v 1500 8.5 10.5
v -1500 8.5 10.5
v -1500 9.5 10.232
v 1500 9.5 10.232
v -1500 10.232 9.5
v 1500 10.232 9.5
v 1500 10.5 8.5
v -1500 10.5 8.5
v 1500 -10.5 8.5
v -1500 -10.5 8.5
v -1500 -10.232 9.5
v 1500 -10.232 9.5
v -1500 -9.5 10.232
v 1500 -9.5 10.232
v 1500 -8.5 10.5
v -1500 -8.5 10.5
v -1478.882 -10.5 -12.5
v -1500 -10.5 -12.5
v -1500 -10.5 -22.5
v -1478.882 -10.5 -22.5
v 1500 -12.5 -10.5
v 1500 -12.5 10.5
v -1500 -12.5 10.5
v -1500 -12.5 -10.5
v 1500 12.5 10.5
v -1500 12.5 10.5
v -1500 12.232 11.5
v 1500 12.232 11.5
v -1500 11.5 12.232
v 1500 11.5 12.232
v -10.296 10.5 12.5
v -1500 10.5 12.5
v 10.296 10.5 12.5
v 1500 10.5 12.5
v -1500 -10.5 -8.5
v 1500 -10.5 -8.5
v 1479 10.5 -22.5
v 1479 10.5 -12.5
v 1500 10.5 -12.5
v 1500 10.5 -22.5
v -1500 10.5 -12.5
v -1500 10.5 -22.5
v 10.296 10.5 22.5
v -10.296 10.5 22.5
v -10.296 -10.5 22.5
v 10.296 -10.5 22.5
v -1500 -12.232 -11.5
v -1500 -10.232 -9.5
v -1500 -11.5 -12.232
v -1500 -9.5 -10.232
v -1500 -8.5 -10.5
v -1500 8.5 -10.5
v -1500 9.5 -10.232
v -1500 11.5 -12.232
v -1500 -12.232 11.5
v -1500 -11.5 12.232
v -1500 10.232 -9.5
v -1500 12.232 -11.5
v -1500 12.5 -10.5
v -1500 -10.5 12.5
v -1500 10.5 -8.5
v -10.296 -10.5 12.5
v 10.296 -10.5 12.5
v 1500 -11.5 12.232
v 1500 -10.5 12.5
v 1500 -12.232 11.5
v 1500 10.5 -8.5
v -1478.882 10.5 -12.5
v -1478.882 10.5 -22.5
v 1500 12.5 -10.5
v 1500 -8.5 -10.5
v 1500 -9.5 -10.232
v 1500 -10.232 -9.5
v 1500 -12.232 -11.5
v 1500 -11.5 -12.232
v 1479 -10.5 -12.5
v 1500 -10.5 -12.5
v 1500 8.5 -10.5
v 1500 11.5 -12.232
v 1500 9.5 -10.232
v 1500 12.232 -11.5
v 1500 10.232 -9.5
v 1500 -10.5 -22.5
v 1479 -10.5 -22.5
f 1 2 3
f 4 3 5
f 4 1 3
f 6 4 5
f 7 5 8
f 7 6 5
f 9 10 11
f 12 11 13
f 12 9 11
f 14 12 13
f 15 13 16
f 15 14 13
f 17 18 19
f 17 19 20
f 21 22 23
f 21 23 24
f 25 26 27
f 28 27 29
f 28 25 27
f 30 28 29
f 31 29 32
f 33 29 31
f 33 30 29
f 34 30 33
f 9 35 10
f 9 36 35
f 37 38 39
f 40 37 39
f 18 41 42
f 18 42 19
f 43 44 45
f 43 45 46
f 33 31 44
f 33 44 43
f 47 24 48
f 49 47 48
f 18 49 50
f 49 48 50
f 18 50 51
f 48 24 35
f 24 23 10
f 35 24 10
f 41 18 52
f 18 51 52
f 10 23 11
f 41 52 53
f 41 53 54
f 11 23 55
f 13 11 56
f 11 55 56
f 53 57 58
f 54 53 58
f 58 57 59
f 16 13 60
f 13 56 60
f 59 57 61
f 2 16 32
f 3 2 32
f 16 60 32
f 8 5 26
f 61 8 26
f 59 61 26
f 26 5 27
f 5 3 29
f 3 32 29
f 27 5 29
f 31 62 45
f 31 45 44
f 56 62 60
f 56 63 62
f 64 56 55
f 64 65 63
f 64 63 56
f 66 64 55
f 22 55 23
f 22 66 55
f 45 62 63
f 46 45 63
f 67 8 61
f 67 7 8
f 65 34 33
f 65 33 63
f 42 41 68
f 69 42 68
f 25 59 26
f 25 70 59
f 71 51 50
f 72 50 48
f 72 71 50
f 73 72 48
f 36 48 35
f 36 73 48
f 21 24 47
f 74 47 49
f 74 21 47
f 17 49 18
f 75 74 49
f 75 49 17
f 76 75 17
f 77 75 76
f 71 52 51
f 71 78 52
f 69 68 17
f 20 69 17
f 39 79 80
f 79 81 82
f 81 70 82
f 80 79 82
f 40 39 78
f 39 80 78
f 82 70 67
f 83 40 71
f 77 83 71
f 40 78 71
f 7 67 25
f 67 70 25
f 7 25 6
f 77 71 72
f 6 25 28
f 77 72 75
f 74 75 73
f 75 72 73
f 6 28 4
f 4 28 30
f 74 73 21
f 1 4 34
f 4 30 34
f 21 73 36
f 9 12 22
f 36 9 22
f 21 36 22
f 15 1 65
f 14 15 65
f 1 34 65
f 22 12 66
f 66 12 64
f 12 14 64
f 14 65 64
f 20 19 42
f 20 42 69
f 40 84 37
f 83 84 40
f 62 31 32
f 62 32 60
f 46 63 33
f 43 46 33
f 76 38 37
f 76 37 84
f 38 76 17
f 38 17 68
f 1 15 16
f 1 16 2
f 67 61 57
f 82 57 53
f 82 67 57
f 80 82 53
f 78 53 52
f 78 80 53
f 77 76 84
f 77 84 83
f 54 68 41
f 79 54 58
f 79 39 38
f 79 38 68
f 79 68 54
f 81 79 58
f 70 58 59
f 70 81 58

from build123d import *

# Parameters (mm, degrees)
F1_DEPTH = 1500
F2_W     = 21.117687
F2_H     = 21
F3_DEPTH = 10
F2_W_2   = 21
F4_DEPTH = 10
F5_W     = 20.59104
F5_H     = 21
F6_DEPTH = 10


with BuildPart() as f1:
    # F0 (on Right) → F1 (new body, symmetric)
    with BuildSketch(Plane.YZ):
        with BuildLine():
            ThreePointArc((12.5, 10.5), (11.914214, 11.914214), (10.5, 12.5))
            Line((10.5, 12.5), (-10.5, 12.5))
            ThreePointArc((-10.5, 12.5), (-11.914214, 11.914214), (-12.5, 10.5))
            Line((-12.5, 10.5), (-12.5, -10.5))
            ThreePointArc((-12.5, -10.5), (-11.914214, -11.914214), (-10.5, -12.5))
            Line((-10.5, -12.5), (10.5, -12.5))
            ThreePointArc((10.5, -12.5), (11.914214, -11.914214), (12.5, -10.5))
            Line((12.5, -10.5), (12.5, 10.5))
        make_face()
        with BuildLine():
            Line((-8.5, 10.5), (8.5, 10.5))
            ThreePointArc((8.5, 10.5), (9.914214, 9.914214), (10.5, 8.5))
            Line((10.5, 8.5), (10.5, -8.5))
            ThreePointArc((10.5, -8.5), (9.914214, -9.914214), (8.5, -10.5))
            Line((8.5, -10.5), (-8.5, -10.5))
            ThreePointArc((-8.5, -10.5), (-9.914214, -9.914214), (-10.5, -8.5))
            Line((-10.5, -8.5), (-10.5, 8.5))
            ThreePointArc((-10.5, 8.5), (-9.914214, 9.914214), (-8.5, 10.5))
        make_face(mode=Mode.SUBTRACT)
    extrude(amount=F1_DEPTH, both=True)

    # F2 (on face) → F3 (join)
    with BuildSketch(Plane(origin=(0, 0, -12.5), x_dir=(1, 0, 0), z_dir=(0, 0, -1))):
        with Locations((-1489.441157, 0)):
            Rectangle(F2_W, F2_H)
    extrude(amount=F3_DEPTH)

    # F2 (on face) → F4 (join)
    with BuildSketch(Plane(origin=(0, 0, -12.5), x_dir=(1, 0, 0), z_dir=(0, 0, -1))):
        with Locations((1489.5, 0)):
            Rectangle(F2_W_2, F2_H)
        with Locations((-1489.441157, 0)):
            Rectangle(F2_W, F2_H)
    extrude(amount=F4_DEPTH)

    # F5 (on face) → F6 (join)
    with BuildSketch(Plane.XY.offset(12.5)):
        Rectangle(F5_W, F5_H)
    extrude(amount=F6_DEPTH)


solid = f1.part
